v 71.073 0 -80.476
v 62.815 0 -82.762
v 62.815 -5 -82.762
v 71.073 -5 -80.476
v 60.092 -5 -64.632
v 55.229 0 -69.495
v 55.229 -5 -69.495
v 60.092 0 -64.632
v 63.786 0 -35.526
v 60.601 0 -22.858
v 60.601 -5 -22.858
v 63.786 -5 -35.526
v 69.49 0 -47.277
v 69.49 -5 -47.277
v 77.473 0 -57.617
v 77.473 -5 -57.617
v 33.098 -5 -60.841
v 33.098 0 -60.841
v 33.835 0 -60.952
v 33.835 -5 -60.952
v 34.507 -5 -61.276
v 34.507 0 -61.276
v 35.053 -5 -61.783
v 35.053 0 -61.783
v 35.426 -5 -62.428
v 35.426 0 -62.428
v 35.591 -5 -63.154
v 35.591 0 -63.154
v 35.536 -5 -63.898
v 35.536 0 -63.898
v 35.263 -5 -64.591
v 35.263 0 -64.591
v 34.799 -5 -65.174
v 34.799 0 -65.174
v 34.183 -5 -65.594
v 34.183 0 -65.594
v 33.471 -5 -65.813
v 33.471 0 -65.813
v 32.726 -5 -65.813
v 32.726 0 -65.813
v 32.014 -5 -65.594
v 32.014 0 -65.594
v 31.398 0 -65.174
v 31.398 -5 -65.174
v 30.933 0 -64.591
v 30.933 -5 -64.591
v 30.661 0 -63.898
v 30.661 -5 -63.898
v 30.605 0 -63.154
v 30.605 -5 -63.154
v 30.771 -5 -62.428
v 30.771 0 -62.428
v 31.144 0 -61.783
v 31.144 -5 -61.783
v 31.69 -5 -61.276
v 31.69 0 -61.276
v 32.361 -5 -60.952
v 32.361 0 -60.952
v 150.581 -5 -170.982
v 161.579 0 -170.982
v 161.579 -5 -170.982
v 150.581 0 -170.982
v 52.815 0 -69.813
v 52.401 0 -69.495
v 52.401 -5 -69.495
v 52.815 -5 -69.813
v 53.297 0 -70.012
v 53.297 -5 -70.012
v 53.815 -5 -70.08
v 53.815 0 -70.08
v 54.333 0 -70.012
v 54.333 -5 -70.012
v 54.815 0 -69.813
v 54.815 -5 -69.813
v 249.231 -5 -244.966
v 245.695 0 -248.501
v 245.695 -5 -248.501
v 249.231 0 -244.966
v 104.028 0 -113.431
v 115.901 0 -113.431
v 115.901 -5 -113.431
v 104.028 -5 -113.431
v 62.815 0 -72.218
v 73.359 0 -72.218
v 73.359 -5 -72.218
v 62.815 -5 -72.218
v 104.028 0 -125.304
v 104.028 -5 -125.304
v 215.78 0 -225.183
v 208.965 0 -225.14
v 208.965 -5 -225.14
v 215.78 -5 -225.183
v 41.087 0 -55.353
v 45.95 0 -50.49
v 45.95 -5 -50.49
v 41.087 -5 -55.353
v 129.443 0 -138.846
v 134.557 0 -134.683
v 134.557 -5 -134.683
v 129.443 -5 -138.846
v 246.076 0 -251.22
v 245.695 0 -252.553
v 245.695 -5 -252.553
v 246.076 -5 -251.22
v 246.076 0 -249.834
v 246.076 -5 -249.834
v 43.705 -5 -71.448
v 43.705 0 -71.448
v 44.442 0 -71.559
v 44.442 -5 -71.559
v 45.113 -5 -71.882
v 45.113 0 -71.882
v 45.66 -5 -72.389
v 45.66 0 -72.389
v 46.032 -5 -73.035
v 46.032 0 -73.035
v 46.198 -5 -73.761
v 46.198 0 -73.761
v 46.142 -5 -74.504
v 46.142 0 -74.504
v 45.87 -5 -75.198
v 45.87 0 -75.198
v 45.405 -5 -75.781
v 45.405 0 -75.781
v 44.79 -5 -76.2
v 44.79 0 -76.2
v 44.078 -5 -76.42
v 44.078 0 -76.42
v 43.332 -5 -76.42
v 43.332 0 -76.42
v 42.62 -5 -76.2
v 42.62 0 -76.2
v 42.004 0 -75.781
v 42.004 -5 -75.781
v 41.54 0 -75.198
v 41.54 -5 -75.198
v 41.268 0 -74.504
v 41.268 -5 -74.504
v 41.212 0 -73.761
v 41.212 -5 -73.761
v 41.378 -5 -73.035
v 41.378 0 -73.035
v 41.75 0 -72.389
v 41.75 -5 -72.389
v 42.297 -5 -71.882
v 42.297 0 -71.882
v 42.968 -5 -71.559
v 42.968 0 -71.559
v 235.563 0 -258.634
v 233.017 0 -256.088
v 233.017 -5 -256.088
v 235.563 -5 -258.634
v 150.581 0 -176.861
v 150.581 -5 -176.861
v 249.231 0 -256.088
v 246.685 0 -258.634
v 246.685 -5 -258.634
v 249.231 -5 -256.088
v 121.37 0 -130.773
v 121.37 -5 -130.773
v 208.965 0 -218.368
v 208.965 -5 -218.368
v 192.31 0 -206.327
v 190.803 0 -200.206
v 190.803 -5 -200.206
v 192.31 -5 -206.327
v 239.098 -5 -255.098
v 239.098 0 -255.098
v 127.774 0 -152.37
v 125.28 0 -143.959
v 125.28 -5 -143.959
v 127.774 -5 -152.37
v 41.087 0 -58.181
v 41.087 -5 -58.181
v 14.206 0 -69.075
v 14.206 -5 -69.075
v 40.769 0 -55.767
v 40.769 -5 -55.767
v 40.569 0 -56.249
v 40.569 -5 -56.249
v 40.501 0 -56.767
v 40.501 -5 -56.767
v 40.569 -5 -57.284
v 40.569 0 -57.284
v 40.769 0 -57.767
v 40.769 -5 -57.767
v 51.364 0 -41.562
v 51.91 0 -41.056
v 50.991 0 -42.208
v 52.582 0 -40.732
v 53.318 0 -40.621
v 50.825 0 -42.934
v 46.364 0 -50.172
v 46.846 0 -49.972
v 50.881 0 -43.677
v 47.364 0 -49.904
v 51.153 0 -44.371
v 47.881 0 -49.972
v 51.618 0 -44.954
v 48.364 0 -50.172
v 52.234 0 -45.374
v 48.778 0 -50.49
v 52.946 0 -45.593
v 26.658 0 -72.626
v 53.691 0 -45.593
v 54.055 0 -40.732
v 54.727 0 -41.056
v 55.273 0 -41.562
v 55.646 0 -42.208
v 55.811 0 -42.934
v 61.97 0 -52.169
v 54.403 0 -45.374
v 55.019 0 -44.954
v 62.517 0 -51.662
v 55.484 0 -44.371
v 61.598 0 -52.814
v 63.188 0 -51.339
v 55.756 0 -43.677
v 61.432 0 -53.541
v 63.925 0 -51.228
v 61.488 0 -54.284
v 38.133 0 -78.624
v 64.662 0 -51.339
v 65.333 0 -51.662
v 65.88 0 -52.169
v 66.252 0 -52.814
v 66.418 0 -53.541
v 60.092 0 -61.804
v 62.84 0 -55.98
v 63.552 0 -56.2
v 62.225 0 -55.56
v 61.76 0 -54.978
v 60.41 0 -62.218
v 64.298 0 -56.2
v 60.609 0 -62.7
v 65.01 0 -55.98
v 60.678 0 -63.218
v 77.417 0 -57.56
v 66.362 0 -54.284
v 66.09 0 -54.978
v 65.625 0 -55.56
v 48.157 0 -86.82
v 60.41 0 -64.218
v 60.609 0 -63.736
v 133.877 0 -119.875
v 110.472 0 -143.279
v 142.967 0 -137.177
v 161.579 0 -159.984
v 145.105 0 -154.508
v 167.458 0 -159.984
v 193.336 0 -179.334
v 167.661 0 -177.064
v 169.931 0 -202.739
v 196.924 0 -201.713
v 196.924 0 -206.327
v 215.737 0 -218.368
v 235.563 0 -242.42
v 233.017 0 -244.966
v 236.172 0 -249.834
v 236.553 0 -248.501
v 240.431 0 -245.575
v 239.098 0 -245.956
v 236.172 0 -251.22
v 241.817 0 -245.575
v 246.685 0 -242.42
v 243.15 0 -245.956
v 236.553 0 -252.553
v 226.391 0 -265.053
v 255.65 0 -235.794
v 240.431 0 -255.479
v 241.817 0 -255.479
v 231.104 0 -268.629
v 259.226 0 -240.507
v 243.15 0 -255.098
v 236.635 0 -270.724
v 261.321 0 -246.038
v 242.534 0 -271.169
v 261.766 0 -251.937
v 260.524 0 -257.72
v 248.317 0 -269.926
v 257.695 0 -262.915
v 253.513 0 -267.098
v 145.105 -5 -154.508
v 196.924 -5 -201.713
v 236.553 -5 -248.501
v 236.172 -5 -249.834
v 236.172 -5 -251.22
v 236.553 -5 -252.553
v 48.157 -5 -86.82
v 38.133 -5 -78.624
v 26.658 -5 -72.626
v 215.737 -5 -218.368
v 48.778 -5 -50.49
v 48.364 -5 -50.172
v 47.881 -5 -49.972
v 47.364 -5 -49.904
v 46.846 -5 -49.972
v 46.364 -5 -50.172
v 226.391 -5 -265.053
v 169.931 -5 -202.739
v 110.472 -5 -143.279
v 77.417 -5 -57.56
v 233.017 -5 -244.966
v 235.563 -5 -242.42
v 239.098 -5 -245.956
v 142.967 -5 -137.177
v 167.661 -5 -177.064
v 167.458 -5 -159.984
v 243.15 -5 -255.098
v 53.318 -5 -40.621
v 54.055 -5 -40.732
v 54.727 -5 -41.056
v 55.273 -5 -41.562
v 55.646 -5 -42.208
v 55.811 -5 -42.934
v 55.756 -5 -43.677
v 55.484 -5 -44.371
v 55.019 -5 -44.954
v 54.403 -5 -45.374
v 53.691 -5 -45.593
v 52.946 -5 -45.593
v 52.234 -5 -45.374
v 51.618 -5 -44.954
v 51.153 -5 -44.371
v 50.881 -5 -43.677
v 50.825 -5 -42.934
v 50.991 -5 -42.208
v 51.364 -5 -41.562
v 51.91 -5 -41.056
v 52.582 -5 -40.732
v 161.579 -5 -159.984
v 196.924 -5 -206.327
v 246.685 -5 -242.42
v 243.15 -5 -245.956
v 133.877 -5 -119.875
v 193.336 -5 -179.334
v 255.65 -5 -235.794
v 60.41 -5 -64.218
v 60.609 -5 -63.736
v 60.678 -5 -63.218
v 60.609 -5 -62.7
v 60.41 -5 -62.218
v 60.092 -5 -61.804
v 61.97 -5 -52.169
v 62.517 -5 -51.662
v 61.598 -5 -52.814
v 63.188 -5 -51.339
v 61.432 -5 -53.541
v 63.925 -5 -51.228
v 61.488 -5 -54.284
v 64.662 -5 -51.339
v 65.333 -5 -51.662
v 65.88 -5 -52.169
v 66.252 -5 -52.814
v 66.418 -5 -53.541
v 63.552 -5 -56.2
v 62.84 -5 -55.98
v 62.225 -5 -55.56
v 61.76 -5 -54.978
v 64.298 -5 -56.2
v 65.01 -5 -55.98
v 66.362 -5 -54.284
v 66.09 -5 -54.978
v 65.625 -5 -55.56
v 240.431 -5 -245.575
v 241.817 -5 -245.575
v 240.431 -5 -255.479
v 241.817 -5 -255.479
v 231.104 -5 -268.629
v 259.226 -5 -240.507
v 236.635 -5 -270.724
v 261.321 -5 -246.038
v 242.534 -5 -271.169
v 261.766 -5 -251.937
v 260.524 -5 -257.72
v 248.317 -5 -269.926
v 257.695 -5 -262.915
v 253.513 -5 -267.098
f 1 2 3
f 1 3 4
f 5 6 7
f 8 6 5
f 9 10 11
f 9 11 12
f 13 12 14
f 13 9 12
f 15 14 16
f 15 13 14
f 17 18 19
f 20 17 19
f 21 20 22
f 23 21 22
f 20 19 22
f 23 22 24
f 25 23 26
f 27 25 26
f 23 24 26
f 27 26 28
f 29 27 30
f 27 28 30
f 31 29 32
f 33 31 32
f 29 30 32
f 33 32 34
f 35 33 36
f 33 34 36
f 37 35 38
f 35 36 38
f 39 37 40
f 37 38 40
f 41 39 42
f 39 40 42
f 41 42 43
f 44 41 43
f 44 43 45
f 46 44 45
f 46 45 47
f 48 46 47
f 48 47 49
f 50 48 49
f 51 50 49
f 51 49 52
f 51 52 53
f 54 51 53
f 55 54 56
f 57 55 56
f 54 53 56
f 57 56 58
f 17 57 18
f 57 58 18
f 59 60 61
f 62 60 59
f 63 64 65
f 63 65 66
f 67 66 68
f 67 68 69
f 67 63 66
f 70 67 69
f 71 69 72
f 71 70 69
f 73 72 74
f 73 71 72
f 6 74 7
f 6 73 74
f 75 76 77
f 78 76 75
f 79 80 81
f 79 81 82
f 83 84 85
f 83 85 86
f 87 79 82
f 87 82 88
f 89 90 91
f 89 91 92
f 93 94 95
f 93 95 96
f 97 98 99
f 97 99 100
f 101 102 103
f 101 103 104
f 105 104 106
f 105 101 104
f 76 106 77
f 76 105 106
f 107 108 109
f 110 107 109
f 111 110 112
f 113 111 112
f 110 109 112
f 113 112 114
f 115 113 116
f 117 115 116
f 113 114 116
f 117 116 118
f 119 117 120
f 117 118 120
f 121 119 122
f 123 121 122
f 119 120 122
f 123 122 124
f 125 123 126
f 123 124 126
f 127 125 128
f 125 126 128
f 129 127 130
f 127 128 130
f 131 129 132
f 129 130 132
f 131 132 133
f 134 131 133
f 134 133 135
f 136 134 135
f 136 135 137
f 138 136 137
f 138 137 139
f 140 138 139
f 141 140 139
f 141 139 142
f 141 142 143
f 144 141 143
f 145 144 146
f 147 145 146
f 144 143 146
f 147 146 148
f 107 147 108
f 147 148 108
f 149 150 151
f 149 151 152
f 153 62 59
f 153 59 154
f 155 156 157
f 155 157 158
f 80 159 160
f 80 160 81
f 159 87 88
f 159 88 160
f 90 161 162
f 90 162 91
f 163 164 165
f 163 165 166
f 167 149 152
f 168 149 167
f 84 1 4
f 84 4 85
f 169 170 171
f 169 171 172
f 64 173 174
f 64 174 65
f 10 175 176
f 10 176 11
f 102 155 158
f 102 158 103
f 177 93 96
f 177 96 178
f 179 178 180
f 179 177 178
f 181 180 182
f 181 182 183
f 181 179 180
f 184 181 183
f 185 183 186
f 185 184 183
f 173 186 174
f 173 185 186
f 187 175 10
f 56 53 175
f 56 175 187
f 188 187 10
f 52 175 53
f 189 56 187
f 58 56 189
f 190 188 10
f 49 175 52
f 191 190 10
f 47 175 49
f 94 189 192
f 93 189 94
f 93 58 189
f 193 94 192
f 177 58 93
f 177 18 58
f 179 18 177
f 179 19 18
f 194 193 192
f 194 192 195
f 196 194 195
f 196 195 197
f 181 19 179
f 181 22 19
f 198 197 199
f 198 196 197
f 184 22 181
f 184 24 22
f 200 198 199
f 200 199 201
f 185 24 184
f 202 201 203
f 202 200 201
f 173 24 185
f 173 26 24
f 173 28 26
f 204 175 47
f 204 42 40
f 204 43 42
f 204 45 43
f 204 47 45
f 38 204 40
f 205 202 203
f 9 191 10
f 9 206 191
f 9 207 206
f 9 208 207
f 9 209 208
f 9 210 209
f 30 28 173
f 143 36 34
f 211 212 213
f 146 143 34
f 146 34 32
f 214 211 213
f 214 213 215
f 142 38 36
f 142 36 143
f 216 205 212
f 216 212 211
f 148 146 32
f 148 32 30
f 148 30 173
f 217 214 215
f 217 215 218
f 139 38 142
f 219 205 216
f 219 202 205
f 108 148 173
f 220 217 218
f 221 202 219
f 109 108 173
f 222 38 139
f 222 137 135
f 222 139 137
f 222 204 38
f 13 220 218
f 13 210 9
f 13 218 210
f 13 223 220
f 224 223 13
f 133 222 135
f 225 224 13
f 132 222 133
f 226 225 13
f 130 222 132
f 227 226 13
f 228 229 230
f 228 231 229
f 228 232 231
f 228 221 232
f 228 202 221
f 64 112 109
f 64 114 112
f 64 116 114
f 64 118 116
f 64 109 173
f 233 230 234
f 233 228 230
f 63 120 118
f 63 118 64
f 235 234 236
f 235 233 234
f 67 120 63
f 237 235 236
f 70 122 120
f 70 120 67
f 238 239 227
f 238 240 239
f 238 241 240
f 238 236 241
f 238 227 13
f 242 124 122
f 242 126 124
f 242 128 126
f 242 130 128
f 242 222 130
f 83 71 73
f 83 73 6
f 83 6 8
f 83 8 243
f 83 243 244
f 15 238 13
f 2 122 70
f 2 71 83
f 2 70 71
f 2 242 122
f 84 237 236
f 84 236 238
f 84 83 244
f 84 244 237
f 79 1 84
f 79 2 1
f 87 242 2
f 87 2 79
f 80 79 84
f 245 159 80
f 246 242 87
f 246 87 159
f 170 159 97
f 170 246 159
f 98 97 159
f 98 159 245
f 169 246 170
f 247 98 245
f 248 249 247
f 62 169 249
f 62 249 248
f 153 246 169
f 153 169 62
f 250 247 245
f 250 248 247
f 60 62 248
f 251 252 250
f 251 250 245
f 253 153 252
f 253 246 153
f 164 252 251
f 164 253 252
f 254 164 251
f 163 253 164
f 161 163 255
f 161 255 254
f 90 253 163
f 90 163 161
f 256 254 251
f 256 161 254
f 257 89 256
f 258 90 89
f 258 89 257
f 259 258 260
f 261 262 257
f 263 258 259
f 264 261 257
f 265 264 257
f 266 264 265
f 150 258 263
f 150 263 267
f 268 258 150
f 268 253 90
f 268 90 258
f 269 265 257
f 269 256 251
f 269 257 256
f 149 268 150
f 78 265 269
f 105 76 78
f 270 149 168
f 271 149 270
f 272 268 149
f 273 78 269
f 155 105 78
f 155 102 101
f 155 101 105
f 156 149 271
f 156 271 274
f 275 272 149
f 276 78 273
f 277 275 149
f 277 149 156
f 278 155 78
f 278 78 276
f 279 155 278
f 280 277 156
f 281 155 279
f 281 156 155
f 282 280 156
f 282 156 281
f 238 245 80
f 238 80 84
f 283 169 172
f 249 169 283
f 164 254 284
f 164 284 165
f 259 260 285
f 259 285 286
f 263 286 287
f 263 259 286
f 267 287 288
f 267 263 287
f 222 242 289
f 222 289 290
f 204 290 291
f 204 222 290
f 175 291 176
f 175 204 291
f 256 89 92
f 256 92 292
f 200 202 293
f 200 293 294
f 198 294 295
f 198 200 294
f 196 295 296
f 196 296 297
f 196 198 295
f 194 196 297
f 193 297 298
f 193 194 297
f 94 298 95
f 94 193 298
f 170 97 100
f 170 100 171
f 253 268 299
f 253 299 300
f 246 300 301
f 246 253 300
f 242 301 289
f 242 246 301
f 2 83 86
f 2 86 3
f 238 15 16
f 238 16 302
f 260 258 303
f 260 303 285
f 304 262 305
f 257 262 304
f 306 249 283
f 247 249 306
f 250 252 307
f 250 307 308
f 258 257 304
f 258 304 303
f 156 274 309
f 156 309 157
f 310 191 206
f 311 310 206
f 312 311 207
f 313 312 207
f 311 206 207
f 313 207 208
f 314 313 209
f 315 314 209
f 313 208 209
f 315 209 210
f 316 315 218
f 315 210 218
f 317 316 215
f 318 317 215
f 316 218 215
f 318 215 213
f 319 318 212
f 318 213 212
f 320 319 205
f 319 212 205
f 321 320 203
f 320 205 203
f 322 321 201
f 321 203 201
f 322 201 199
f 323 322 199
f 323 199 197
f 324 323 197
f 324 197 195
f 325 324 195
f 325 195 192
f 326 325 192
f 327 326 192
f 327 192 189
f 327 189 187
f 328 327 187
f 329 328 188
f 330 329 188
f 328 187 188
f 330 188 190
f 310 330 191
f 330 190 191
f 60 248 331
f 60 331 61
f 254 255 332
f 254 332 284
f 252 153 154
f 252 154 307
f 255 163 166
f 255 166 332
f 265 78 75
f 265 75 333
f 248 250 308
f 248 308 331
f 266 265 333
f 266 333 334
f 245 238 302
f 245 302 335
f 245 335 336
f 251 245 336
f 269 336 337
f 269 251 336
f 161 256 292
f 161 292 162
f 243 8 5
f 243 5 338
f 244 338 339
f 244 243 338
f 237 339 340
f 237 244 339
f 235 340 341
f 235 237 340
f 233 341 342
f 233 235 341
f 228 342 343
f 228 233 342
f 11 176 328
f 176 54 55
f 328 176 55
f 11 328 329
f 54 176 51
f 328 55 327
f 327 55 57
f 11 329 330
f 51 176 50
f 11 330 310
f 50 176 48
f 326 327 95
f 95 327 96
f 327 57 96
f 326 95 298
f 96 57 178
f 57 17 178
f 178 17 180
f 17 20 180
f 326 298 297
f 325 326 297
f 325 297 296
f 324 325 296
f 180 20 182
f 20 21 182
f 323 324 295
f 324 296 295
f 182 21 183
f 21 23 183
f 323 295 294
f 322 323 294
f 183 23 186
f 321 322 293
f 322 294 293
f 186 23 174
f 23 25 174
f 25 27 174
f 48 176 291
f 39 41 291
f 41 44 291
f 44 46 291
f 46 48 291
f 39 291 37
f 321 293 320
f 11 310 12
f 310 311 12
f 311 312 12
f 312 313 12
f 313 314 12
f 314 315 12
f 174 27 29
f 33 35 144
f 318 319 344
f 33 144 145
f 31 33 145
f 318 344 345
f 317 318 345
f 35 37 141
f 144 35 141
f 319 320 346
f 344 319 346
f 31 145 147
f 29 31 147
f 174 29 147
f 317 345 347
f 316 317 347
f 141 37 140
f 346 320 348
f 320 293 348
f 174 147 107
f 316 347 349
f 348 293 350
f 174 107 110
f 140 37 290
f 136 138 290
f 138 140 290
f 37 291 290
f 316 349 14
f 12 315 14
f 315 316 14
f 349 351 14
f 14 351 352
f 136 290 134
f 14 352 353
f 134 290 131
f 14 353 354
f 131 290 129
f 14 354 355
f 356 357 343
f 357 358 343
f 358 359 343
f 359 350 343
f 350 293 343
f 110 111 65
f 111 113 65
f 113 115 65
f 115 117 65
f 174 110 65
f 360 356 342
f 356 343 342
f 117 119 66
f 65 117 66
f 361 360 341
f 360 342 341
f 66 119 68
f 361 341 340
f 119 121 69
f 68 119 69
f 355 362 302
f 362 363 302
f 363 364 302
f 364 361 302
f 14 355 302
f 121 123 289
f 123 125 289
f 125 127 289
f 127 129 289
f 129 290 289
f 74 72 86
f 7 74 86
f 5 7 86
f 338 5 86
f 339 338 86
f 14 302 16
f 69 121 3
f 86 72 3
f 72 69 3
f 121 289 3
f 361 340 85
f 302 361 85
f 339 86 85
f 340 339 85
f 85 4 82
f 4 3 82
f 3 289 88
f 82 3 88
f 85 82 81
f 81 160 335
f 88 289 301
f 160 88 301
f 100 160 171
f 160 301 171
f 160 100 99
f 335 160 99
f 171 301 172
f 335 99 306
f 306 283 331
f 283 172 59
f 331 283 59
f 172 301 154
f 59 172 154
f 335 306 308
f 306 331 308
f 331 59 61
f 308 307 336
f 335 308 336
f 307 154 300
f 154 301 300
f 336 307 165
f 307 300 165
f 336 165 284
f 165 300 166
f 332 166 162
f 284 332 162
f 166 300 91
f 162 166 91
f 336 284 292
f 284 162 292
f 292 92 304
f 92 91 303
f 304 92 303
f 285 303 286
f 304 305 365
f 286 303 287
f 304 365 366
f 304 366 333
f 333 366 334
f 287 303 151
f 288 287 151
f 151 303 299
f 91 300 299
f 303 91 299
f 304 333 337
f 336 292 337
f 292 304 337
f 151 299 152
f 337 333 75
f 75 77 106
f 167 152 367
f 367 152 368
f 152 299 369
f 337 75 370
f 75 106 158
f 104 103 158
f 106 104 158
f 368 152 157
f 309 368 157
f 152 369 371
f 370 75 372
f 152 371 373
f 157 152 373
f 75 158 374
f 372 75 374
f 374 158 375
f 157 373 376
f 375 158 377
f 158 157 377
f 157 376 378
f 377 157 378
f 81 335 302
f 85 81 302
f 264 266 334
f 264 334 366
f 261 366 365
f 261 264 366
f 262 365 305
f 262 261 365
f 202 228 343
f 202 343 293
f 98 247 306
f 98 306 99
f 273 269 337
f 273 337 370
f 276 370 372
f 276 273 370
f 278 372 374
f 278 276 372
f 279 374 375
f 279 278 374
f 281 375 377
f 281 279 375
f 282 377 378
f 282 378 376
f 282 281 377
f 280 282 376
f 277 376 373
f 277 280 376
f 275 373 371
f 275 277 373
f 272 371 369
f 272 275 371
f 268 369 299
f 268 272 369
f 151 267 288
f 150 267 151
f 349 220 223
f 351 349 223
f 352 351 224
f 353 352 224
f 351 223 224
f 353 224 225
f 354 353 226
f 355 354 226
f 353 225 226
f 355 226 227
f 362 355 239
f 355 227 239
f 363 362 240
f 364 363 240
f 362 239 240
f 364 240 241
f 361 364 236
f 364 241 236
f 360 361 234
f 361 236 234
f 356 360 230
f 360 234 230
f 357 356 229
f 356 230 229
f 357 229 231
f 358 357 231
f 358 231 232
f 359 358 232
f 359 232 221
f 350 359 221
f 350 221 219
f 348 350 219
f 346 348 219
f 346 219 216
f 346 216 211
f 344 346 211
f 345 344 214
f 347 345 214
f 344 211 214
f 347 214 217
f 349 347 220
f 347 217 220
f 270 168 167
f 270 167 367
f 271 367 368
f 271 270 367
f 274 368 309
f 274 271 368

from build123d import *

# Parameters (mm, degrees)
SKETCH1_R           = 2.5
BOSS_EXTRUDE2_DEPTH = 5


with BuildPart() as part:
    # Sketch1 → Boss-Extrude2 (new body)
    with BuildSketch(Plane(origin=(0, 0, 0), x_dir=(1, 0, 0), z_dir=(0, 1, 0))):
        with BuildLine():
            ThreePointArc((48.157439134, 86.819747349), (32.548521434, 75.332166703), (14.205825824, 69.075303385))
            Line((14.205825824, 69.075303385), (60.601080618, 22.857899217))
            ThreePointArc((60.601080618, 22.857899217), (66.335448138, 41.548589345), (77.473000793, 57.616563367))
            Line((77.473000793, 57.616563367), (77.416811954, 57.560374528))
            ThreePointArc((77.416811954, 57.560374528), (163.240056955, 149.970690922), (255.650373348, 235.793935922))
            ThreePointArc((255.650373348, 235.793935922), (255.754156467, 265.157091862), (226.391000527, 265.053308743))
            ThreePointArc((226.391000527, 265.053308743), (140.567755527, 172.64299235), (48.157439134, 86.819747349))
        make_face()
        with Locations(Location((53.318451782, 43.121161597, 0), (0, 0, 270))):
            Circle(SKETCH1_R, mode=Mode.SUBTRACT)
        with Locations(Location((63.9250535, 53.727763315, 0), (0, 0, 270))):
            Circle(SKETCH1_R, mode=Mode.SUBTRACT)
        with Locations(Location((33.098323122, 63.341290256, 0), (0, 0, 270))):
            Circle(SKETCH1_R, mode=Mode.SUBTRACT)
        with Locations(Location((43.70492484, 73.947891974, 0), (0, 0, 270))):
            Circle(SKETCH1_R, mode=Mode.SUBTRACT)
        with BuildLine():
            Line((55.229202732, 69.494681894), (60.091746499, 64.632138127))
            ThreePointArc((60.091746499, 64.632138127), (60.677532937, 63.217924565), (60.091746499, 61.803711002))
            Line((60.091746499, 61.803711002), (48.778038, 50.490002503))
            ThreePointArc((48.778038, 50.490002503), (47.363824438, 49.904216066), (45.949610875, 50.490002503))
            Line((45.949610875, 50.490002503), (41.087067109, 55.35254627))
            ThreePointArc((41.087067109, 55.35254627), (40.501280671, 56.766759833), (41.087067109, 58.180973395))
            Line((41.087067109, 58.180973395), (52.400775608, 69.494681894))
            ThreePointArc((52.400775608, 69.494681894), (53.81498917, 70.080468332), (55.229202732, 69.494681894))
        make_face(mode=Mode.SUBTRACT)
        Polygon((73.358826127, 72.218155358), (62.815219963, 72.218155358), (62.815219963, 82.761761522), (71.072742678, 80.475678073), align=None, mode=Mode.SUBTRACT)
        Polygon((115.901419717, 113.431281172), (104.028345777, 113.431281172), (104.028345777, 125.304355111), (121.370050098, 130.772985493), align=None, mode=Mode.SUBTRACT)
        Polygon((127.774493656, 152.369634944), (145.10497222, 154.507907615), (142.966699549, 137.177429051), (134.556556076, 134.683417686), (129.44306902, 138.846004415), (125.280482291, 143.959491471), align=None, mode=Mode.SUBTRACT)
        Polygon((161.578803014, 170.981738409), (150.580944654, 170.981738409), (150.580944654, 176.860832319), (167.661082015, 177.06401741), (167.457896924, 159.983880049), (161.578803014, 159.983880049), align=None, mode=Mode.SUBTRACT)
        Polygon((192.31024704, 206.32683153), (196.923896135, 206.32683153), (196.923896135, 201.713182434), (190.803246876, 200.206182271), align=None, mode=Mode.SUBTRACT)
        Polygon((215.737142693, 218.36823138), (208.965295985, 218.36823138), (208.965295985, 225.140078087), (215.779590379, 225.182525773), align=None, mode=Mode.SUBTRACT)
        with BuildLine():
            ThreePointArc((239.098412236, 255.098316632), (241.12410453, 255.527039925), (243.149796825, 255.098316632))
            Line((243.149796825, 255.098316632), (246.685330731, 258.633850538))
            Line((246.685330731, 258.633850538), (249.230915143, 256.088266125))
            Line((249.230915143, 256.088266125), (245.695381237, 252.552732219))
            ThreePointArc((245.695381237, 252.552732219), (246.12410453, 250.527039925), (245.695381237, 248.501347631))
            Line((245.695381237, 248.501347631), (249.230915143, 244.965813725))
            Line((249.230915143, 244.965813725), (246.685330731, 242.420229312))
            Line((246.685330731, 242.420229312), (243.149796825, 245.955763218))
            ThreePointArc((243.149796825, 245.955763218), (241.12410453, 245.527039925), (239.098412236, 245.955763218))
            Line((239.098412236, 245.955763218), (235.56287833, 242.420229312))
            Line((235.56287833, 242.420229312), (233.017293918, 244.965813725))
            Line((233.017293918, 244.965813725), (236.552827824, 248.501347631))
            ThreePointArc((236.552827824, 248.501347631), (236.12410453, 250.527039925), (236.552827824, 252.552732219))
            Line((236.552827824, 252.552732219), (233.017293918, 256.088266125))
            Line((233.017293918, 256.088266125), (235.56287833, 258.633850538))
            Line((235.56287833, 258.633850538), (239.098412236, 255.098316632))
        make_face(mode=Mode.SUBTRACT)
    extrude(amount=-BOSS_EXTRUDE2_DEPTH)


solid = part.part
